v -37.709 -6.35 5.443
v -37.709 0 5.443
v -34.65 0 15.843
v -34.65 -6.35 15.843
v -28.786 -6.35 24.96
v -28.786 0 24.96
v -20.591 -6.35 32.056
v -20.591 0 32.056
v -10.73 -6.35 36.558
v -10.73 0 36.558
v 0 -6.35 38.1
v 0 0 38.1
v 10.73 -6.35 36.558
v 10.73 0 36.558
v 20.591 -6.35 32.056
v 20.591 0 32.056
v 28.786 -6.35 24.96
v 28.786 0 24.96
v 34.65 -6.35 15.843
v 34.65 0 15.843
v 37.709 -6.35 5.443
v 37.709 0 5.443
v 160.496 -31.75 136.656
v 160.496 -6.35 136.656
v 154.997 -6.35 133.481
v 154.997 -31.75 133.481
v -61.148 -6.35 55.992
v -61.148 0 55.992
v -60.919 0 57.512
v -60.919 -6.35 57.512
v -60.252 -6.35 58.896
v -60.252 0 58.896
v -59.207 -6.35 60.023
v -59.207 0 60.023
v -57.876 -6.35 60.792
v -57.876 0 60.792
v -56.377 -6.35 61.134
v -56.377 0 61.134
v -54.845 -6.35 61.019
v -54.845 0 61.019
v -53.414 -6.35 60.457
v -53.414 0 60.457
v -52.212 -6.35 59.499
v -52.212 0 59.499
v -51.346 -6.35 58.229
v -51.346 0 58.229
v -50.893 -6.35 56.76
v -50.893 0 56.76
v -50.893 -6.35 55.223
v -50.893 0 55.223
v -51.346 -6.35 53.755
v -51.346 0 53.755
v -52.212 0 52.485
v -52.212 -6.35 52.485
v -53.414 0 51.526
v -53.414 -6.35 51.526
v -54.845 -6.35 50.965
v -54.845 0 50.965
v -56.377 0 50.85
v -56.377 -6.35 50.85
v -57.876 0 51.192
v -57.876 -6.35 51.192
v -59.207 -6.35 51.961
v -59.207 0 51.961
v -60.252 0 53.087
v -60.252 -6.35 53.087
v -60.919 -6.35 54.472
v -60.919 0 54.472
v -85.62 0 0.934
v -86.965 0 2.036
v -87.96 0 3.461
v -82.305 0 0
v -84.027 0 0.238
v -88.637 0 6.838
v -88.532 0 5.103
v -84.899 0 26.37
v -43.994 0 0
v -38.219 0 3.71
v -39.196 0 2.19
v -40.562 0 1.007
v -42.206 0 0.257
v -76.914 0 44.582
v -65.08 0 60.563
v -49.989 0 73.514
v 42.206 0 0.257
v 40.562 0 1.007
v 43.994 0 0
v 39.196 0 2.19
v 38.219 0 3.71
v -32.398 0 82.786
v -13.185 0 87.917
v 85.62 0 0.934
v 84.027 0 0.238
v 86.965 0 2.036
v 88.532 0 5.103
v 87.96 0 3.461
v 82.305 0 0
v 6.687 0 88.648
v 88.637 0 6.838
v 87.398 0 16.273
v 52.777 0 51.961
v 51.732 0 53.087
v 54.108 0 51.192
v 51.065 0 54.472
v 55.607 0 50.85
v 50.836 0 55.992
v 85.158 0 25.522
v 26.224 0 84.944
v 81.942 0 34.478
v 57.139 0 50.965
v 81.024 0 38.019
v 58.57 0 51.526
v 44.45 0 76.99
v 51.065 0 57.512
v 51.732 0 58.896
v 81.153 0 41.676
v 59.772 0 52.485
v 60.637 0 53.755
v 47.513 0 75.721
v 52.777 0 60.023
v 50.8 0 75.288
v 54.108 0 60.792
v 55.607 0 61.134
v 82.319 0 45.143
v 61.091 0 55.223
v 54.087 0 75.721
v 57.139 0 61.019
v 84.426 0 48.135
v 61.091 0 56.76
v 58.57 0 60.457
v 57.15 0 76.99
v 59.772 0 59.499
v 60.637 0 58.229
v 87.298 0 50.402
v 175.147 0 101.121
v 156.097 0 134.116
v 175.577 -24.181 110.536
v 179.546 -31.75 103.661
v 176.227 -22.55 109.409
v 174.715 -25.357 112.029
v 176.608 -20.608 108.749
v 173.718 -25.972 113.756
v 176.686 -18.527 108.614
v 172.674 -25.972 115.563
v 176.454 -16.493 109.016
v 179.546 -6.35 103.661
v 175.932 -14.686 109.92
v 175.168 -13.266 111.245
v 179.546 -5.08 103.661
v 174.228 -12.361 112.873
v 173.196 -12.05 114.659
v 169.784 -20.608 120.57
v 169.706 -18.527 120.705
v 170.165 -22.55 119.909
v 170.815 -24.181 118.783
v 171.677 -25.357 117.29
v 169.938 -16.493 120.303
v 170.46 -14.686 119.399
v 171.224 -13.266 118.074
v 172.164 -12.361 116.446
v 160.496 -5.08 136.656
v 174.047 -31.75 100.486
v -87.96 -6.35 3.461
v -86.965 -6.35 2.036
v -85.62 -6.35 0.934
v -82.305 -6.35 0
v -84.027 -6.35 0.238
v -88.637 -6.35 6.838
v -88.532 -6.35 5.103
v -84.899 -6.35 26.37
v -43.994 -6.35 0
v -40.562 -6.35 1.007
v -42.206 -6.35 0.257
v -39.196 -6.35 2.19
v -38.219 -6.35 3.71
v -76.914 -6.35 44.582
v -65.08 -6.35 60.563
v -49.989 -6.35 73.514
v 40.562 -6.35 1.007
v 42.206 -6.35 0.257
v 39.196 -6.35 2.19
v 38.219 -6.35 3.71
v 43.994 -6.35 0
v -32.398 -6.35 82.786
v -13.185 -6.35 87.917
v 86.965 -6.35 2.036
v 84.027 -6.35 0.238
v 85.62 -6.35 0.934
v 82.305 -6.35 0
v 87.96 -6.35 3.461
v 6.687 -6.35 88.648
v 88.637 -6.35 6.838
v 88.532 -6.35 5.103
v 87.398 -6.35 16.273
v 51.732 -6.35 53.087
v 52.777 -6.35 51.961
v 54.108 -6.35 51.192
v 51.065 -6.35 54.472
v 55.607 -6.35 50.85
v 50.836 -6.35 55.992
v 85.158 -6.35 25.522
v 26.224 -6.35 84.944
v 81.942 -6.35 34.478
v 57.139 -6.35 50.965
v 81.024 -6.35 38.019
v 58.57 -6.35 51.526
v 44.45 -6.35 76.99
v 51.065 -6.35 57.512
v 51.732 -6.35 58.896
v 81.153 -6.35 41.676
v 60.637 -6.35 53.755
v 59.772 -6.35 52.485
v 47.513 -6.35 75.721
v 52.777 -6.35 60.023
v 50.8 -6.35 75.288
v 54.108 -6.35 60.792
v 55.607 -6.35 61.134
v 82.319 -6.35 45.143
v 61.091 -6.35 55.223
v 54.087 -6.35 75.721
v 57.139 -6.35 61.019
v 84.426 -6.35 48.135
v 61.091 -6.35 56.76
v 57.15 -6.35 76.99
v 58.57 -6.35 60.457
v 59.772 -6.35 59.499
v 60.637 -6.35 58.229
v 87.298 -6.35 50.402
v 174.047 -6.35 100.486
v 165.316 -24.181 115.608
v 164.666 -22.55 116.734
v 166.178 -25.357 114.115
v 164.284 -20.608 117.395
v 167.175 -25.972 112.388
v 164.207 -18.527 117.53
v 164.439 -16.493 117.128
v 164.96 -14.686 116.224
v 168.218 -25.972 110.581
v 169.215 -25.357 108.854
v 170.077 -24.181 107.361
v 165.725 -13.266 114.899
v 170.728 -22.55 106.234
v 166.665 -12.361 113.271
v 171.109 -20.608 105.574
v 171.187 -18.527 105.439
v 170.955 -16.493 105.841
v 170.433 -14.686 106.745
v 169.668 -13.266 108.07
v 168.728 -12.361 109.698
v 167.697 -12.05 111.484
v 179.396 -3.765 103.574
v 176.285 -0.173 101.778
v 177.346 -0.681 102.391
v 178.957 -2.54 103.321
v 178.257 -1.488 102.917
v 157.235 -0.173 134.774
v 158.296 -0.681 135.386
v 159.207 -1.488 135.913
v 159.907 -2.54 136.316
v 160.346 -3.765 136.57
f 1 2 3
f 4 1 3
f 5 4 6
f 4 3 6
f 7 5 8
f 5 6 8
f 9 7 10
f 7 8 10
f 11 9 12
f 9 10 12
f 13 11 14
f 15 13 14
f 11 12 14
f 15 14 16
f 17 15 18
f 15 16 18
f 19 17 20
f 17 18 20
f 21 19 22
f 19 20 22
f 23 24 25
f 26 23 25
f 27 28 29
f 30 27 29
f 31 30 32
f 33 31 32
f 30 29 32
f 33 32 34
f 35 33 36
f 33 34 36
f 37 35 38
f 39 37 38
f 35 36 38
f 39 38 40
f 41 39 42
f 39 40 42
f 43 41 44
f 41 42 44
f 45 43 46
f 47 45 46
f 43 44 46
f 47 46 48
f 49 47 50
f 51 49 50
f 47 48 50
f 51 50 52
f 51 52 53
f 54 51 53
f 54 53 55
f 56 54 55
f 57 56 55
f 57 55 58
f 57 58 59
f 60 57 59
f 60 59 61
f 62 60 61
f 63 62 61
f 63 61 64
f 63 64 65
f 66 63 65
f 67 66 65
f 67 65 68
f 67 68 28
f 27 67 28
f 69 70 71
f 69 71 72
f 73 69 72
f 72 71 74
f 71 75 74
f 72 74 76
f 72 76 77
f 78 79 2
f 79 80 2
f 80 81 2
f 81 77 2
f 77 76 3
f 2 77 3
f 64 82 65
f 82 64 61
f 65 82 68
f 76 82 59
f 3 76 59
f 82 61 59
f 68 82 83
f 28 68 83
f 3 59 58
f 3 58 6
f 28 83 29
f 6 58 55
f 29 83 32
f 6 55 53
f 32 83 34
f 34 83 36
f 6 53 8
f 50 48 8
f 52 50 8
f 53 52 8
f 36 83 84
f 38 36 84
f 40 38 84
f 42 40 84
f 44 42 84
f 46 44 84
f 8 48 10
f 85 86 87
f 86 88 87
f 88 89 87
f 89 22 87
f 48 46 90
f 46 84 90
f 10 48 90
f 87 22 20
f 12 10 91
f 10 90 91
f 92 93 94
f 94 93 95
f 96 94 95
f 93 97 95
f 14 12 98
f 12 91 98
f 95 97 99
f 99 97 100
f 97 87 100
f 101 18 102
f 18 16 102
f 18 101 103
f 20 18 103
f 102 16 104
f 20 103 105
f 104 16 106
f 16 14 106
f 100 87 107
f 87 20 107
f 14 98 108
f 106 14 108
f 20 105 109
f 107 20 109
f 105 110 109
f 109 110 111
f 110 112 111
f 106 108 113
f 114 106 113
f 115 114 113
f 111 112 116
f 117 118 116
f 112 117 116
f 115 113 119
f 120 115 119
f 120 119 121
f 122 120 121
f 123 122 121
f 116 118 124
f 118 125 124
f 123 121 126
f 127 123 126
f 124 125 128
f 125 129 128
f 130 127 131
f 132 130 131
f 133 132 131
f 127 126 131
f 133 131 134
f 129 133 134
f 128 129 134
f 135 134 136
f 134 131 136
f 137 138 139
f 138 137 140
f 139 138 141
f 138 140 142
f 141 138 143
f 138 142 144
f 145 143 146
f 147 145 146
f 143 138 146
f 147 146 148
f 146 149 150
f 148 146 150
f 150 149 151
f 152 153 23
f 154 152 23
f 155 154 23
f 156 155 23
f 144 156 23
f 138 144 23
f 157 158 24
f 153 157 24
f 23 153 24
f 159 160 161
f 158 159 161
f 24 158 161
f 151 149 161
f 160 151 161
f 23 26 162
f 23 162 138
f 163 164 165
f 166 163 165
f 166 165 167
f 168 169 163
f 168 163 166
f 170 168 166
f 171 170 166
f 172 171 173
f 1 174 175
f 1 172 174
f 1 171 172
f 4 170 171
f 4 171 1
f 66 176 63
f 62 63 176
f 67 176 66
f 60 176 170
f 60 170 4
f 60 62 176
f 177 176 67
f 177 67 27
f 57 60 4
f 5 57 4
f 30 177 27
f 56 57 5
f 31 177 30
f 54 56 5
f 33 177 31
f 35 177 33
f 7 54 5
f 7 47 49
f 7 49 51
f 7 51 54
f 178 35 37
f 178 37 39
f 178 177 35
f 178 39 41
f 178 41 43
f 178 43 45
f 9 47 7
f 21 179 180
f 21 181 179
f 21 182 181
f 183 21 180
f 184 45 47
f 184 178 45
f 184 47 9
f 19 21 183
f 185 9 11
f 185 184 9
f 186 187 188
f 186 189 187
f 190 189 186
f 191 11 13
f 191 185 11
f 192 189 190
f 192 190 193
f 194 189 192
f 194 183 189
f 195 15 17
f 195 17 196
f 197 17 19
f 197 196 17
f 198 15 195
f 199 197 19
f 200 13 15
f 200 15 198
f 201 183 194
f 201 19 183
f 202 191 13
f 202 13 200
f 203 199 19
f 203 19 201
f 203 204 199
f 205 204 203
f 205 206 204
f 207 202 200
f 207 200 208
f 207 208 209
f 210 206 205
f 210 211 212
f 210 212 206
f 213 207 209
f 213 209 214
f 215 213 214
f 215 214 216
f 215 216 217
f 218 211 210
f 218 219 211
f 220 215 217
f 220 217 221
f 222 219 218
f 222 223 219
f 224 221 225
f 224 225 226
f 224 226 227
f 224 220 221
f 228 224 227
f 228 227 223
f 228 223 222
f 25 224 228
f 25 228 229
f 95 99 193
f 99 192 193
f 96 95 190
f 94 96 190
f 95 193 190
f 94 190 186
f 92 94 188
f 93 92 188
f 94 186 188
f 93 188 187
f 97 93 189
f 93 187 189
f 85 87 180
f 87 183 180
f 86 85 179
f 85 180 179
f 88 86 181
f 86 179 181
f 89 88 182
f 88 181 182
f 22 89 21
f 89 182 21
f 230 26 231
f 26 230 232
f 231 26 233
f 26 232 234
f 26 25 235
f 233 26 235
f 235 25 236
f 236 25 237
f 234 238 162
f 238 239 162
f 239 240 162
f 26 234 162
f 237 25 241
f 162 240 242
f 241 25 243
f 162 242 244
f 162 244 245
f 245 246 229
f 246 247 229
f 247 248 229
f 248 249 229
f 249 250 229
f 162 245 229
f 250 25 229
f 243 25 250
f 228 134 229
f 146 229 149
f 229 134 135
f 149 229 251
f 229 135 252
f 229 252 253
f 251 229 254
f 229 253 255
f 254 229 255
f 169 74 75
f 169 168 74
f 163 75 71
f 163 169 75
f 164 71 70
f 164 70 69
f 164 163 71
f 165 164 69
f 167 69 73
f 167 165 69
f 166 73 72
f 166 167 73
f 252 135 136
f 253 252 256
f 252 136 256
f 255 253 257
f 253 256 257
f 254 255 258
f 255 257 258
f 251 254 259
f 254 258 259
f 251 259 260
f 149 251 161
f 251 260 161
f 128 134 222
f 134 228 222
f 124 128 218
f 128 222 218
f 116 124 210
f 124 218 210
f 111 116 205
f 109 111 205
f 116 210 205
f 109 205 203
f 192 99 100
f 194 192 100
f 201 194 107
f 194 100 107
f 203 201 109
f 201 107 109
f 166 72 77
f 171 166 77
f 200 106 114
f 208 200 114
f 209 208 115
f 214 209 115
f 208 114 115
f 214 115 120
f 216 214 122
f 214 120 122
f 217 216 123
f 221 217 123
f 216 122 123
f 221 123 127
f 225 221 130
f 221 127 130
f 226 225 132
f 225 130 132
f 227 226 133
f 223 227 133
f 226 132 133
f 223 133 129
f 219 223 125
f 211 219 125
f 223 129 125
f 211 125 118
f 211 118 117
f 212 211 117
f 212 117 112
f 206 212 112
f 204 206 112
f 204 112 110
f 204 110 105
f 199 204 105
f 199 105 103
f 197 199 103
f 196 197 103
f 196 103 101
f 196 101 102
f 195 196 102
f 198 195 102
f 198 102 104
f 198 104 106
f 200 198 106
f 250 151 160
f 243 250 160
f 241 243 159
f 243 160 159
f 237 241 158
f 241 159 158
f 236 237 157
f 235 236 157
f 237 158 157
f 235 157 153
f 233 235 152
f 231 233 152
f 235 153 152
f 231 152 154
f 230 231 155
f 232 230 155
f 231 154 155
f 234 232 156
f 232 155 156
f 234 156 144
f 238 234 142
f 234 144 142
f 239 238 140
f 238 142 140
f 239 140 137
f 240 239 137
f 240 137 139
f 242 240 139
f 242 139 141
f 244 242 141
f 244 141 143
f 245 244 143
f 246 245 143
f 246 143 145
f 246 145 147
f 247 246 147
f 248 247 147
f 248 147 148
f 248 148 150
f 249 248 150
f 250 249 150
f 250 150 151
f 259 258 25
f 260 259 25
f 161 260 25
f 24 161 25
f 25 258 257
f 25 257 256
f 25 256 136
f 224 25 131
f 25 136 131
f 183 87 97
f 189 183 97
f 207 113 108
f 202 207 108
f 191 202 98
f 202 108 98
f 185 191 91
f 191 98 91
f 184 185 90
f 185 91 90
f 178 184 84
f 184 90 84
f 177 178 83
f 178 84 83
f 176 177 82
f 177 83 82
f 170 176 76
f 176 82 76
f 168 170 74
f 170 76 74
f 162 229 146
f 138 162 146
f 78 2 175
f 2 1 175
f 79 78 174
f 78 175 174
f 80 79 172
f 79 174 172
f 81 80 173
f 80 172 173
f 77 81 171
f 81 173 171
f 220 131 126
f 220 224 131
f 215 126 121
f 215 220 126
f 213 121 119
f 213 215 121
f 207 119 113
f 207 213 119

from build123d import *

# Parameters (mm, degrees)
F1_DEPTH = 6.35
F3_D     = 10.3124
F5_DEPTH = 25.4
F7_D     = 14
F8_R     = 12.7
F9_R     = 5.08
F10_R    = 6.35


# Not quite as in the source:
# - a feature names something its author has since deleted; it is built from what else it names


with BuildPart() as f1:
    # F0 (on Front) → F1 (new body)
    with BuildSketch(Plane.XZ):
        with BuildLine():
            Line((38.1, 0), (88.9, 0))
            ThreePointArc((88.9, 0), (85.8708059571, 23.0090131096), (76.9896583964, 44.45))
            Line((76.9896583964, 44.45), (179.5459910838, 103.6609262841))
            Line((179.5459910838, 103.6609262841), (160.4959910838, 136.6564941683))
            Line((160.4959910838, 136.6564941683), (50.5107648032, 73.1564941683))
            ThreePointArc((50.5107648032, 73.1564941683), (-41.3086129578, 78.7198100576), (-88.9, 0))
            Line((-88.9, 0), (-38.1, 0))
            ThreePointArc((-38.1, 0), (0, 38.1), (38.1, 0))
        make_face()
    extrude(amount=F1_DEPTH)

    # F3 (through all)
    with Locations(Plane.XZ.offset(6.35)):
        with Locations((-55.9918969149, 55.9918969149), (55.9918969149, 55.9918969149)):
            Hole(F3_D / 2)

    # F4 (on face) → F5 (join)
    with BuildSketch(Plane.XZ.offset(6.35)):
        Polygon((160.4959910838, 136.6564941683), (154.9967297697, 133.4814941683), (174.0467297697, 100.4859262841), (179.5459910838, 103.6609262841), align=None)
    extrude(amount=F5_DEPTH)

    # F7 (through all)
    with Locations(Plane(origin=(174.0467297697, 0, 100.4859262841), x_dir=(0, -1, 0), z_dir=(-0.8660254038, 0, -0.5))):
        with Locations((19.05, 12.7)):
            Hole(F7_D / 2)

    # F8
    f8_edges = [f1.edges().sort_by_distance(p)[0] for p in [
        (50.510765, -3.175, 73.156494),
        (76.989658, -3.175, 44.45),
    ]]
    fillet(f8_edges, radius=F8_R)

    # F9
    f9_edges = [f1.edges().sort_by_distance(p)[0] for p in [
        (170.020991, 0, 120.15871),
    ]]
    fillet(f9_edges, radius=F9_R)

    # F10
    f10_edges = [f1.edges().sort_by_distance(p)[0] for p in [
        (88.9, -3.175, 0),
        (38.1, -3.175, 0),
        (-38.1, -3.175, 0),
        (-88.9, -3.175, 0),
    ]]
    fillet(f10_edges, radius=F10_R)


solid = f1.part
